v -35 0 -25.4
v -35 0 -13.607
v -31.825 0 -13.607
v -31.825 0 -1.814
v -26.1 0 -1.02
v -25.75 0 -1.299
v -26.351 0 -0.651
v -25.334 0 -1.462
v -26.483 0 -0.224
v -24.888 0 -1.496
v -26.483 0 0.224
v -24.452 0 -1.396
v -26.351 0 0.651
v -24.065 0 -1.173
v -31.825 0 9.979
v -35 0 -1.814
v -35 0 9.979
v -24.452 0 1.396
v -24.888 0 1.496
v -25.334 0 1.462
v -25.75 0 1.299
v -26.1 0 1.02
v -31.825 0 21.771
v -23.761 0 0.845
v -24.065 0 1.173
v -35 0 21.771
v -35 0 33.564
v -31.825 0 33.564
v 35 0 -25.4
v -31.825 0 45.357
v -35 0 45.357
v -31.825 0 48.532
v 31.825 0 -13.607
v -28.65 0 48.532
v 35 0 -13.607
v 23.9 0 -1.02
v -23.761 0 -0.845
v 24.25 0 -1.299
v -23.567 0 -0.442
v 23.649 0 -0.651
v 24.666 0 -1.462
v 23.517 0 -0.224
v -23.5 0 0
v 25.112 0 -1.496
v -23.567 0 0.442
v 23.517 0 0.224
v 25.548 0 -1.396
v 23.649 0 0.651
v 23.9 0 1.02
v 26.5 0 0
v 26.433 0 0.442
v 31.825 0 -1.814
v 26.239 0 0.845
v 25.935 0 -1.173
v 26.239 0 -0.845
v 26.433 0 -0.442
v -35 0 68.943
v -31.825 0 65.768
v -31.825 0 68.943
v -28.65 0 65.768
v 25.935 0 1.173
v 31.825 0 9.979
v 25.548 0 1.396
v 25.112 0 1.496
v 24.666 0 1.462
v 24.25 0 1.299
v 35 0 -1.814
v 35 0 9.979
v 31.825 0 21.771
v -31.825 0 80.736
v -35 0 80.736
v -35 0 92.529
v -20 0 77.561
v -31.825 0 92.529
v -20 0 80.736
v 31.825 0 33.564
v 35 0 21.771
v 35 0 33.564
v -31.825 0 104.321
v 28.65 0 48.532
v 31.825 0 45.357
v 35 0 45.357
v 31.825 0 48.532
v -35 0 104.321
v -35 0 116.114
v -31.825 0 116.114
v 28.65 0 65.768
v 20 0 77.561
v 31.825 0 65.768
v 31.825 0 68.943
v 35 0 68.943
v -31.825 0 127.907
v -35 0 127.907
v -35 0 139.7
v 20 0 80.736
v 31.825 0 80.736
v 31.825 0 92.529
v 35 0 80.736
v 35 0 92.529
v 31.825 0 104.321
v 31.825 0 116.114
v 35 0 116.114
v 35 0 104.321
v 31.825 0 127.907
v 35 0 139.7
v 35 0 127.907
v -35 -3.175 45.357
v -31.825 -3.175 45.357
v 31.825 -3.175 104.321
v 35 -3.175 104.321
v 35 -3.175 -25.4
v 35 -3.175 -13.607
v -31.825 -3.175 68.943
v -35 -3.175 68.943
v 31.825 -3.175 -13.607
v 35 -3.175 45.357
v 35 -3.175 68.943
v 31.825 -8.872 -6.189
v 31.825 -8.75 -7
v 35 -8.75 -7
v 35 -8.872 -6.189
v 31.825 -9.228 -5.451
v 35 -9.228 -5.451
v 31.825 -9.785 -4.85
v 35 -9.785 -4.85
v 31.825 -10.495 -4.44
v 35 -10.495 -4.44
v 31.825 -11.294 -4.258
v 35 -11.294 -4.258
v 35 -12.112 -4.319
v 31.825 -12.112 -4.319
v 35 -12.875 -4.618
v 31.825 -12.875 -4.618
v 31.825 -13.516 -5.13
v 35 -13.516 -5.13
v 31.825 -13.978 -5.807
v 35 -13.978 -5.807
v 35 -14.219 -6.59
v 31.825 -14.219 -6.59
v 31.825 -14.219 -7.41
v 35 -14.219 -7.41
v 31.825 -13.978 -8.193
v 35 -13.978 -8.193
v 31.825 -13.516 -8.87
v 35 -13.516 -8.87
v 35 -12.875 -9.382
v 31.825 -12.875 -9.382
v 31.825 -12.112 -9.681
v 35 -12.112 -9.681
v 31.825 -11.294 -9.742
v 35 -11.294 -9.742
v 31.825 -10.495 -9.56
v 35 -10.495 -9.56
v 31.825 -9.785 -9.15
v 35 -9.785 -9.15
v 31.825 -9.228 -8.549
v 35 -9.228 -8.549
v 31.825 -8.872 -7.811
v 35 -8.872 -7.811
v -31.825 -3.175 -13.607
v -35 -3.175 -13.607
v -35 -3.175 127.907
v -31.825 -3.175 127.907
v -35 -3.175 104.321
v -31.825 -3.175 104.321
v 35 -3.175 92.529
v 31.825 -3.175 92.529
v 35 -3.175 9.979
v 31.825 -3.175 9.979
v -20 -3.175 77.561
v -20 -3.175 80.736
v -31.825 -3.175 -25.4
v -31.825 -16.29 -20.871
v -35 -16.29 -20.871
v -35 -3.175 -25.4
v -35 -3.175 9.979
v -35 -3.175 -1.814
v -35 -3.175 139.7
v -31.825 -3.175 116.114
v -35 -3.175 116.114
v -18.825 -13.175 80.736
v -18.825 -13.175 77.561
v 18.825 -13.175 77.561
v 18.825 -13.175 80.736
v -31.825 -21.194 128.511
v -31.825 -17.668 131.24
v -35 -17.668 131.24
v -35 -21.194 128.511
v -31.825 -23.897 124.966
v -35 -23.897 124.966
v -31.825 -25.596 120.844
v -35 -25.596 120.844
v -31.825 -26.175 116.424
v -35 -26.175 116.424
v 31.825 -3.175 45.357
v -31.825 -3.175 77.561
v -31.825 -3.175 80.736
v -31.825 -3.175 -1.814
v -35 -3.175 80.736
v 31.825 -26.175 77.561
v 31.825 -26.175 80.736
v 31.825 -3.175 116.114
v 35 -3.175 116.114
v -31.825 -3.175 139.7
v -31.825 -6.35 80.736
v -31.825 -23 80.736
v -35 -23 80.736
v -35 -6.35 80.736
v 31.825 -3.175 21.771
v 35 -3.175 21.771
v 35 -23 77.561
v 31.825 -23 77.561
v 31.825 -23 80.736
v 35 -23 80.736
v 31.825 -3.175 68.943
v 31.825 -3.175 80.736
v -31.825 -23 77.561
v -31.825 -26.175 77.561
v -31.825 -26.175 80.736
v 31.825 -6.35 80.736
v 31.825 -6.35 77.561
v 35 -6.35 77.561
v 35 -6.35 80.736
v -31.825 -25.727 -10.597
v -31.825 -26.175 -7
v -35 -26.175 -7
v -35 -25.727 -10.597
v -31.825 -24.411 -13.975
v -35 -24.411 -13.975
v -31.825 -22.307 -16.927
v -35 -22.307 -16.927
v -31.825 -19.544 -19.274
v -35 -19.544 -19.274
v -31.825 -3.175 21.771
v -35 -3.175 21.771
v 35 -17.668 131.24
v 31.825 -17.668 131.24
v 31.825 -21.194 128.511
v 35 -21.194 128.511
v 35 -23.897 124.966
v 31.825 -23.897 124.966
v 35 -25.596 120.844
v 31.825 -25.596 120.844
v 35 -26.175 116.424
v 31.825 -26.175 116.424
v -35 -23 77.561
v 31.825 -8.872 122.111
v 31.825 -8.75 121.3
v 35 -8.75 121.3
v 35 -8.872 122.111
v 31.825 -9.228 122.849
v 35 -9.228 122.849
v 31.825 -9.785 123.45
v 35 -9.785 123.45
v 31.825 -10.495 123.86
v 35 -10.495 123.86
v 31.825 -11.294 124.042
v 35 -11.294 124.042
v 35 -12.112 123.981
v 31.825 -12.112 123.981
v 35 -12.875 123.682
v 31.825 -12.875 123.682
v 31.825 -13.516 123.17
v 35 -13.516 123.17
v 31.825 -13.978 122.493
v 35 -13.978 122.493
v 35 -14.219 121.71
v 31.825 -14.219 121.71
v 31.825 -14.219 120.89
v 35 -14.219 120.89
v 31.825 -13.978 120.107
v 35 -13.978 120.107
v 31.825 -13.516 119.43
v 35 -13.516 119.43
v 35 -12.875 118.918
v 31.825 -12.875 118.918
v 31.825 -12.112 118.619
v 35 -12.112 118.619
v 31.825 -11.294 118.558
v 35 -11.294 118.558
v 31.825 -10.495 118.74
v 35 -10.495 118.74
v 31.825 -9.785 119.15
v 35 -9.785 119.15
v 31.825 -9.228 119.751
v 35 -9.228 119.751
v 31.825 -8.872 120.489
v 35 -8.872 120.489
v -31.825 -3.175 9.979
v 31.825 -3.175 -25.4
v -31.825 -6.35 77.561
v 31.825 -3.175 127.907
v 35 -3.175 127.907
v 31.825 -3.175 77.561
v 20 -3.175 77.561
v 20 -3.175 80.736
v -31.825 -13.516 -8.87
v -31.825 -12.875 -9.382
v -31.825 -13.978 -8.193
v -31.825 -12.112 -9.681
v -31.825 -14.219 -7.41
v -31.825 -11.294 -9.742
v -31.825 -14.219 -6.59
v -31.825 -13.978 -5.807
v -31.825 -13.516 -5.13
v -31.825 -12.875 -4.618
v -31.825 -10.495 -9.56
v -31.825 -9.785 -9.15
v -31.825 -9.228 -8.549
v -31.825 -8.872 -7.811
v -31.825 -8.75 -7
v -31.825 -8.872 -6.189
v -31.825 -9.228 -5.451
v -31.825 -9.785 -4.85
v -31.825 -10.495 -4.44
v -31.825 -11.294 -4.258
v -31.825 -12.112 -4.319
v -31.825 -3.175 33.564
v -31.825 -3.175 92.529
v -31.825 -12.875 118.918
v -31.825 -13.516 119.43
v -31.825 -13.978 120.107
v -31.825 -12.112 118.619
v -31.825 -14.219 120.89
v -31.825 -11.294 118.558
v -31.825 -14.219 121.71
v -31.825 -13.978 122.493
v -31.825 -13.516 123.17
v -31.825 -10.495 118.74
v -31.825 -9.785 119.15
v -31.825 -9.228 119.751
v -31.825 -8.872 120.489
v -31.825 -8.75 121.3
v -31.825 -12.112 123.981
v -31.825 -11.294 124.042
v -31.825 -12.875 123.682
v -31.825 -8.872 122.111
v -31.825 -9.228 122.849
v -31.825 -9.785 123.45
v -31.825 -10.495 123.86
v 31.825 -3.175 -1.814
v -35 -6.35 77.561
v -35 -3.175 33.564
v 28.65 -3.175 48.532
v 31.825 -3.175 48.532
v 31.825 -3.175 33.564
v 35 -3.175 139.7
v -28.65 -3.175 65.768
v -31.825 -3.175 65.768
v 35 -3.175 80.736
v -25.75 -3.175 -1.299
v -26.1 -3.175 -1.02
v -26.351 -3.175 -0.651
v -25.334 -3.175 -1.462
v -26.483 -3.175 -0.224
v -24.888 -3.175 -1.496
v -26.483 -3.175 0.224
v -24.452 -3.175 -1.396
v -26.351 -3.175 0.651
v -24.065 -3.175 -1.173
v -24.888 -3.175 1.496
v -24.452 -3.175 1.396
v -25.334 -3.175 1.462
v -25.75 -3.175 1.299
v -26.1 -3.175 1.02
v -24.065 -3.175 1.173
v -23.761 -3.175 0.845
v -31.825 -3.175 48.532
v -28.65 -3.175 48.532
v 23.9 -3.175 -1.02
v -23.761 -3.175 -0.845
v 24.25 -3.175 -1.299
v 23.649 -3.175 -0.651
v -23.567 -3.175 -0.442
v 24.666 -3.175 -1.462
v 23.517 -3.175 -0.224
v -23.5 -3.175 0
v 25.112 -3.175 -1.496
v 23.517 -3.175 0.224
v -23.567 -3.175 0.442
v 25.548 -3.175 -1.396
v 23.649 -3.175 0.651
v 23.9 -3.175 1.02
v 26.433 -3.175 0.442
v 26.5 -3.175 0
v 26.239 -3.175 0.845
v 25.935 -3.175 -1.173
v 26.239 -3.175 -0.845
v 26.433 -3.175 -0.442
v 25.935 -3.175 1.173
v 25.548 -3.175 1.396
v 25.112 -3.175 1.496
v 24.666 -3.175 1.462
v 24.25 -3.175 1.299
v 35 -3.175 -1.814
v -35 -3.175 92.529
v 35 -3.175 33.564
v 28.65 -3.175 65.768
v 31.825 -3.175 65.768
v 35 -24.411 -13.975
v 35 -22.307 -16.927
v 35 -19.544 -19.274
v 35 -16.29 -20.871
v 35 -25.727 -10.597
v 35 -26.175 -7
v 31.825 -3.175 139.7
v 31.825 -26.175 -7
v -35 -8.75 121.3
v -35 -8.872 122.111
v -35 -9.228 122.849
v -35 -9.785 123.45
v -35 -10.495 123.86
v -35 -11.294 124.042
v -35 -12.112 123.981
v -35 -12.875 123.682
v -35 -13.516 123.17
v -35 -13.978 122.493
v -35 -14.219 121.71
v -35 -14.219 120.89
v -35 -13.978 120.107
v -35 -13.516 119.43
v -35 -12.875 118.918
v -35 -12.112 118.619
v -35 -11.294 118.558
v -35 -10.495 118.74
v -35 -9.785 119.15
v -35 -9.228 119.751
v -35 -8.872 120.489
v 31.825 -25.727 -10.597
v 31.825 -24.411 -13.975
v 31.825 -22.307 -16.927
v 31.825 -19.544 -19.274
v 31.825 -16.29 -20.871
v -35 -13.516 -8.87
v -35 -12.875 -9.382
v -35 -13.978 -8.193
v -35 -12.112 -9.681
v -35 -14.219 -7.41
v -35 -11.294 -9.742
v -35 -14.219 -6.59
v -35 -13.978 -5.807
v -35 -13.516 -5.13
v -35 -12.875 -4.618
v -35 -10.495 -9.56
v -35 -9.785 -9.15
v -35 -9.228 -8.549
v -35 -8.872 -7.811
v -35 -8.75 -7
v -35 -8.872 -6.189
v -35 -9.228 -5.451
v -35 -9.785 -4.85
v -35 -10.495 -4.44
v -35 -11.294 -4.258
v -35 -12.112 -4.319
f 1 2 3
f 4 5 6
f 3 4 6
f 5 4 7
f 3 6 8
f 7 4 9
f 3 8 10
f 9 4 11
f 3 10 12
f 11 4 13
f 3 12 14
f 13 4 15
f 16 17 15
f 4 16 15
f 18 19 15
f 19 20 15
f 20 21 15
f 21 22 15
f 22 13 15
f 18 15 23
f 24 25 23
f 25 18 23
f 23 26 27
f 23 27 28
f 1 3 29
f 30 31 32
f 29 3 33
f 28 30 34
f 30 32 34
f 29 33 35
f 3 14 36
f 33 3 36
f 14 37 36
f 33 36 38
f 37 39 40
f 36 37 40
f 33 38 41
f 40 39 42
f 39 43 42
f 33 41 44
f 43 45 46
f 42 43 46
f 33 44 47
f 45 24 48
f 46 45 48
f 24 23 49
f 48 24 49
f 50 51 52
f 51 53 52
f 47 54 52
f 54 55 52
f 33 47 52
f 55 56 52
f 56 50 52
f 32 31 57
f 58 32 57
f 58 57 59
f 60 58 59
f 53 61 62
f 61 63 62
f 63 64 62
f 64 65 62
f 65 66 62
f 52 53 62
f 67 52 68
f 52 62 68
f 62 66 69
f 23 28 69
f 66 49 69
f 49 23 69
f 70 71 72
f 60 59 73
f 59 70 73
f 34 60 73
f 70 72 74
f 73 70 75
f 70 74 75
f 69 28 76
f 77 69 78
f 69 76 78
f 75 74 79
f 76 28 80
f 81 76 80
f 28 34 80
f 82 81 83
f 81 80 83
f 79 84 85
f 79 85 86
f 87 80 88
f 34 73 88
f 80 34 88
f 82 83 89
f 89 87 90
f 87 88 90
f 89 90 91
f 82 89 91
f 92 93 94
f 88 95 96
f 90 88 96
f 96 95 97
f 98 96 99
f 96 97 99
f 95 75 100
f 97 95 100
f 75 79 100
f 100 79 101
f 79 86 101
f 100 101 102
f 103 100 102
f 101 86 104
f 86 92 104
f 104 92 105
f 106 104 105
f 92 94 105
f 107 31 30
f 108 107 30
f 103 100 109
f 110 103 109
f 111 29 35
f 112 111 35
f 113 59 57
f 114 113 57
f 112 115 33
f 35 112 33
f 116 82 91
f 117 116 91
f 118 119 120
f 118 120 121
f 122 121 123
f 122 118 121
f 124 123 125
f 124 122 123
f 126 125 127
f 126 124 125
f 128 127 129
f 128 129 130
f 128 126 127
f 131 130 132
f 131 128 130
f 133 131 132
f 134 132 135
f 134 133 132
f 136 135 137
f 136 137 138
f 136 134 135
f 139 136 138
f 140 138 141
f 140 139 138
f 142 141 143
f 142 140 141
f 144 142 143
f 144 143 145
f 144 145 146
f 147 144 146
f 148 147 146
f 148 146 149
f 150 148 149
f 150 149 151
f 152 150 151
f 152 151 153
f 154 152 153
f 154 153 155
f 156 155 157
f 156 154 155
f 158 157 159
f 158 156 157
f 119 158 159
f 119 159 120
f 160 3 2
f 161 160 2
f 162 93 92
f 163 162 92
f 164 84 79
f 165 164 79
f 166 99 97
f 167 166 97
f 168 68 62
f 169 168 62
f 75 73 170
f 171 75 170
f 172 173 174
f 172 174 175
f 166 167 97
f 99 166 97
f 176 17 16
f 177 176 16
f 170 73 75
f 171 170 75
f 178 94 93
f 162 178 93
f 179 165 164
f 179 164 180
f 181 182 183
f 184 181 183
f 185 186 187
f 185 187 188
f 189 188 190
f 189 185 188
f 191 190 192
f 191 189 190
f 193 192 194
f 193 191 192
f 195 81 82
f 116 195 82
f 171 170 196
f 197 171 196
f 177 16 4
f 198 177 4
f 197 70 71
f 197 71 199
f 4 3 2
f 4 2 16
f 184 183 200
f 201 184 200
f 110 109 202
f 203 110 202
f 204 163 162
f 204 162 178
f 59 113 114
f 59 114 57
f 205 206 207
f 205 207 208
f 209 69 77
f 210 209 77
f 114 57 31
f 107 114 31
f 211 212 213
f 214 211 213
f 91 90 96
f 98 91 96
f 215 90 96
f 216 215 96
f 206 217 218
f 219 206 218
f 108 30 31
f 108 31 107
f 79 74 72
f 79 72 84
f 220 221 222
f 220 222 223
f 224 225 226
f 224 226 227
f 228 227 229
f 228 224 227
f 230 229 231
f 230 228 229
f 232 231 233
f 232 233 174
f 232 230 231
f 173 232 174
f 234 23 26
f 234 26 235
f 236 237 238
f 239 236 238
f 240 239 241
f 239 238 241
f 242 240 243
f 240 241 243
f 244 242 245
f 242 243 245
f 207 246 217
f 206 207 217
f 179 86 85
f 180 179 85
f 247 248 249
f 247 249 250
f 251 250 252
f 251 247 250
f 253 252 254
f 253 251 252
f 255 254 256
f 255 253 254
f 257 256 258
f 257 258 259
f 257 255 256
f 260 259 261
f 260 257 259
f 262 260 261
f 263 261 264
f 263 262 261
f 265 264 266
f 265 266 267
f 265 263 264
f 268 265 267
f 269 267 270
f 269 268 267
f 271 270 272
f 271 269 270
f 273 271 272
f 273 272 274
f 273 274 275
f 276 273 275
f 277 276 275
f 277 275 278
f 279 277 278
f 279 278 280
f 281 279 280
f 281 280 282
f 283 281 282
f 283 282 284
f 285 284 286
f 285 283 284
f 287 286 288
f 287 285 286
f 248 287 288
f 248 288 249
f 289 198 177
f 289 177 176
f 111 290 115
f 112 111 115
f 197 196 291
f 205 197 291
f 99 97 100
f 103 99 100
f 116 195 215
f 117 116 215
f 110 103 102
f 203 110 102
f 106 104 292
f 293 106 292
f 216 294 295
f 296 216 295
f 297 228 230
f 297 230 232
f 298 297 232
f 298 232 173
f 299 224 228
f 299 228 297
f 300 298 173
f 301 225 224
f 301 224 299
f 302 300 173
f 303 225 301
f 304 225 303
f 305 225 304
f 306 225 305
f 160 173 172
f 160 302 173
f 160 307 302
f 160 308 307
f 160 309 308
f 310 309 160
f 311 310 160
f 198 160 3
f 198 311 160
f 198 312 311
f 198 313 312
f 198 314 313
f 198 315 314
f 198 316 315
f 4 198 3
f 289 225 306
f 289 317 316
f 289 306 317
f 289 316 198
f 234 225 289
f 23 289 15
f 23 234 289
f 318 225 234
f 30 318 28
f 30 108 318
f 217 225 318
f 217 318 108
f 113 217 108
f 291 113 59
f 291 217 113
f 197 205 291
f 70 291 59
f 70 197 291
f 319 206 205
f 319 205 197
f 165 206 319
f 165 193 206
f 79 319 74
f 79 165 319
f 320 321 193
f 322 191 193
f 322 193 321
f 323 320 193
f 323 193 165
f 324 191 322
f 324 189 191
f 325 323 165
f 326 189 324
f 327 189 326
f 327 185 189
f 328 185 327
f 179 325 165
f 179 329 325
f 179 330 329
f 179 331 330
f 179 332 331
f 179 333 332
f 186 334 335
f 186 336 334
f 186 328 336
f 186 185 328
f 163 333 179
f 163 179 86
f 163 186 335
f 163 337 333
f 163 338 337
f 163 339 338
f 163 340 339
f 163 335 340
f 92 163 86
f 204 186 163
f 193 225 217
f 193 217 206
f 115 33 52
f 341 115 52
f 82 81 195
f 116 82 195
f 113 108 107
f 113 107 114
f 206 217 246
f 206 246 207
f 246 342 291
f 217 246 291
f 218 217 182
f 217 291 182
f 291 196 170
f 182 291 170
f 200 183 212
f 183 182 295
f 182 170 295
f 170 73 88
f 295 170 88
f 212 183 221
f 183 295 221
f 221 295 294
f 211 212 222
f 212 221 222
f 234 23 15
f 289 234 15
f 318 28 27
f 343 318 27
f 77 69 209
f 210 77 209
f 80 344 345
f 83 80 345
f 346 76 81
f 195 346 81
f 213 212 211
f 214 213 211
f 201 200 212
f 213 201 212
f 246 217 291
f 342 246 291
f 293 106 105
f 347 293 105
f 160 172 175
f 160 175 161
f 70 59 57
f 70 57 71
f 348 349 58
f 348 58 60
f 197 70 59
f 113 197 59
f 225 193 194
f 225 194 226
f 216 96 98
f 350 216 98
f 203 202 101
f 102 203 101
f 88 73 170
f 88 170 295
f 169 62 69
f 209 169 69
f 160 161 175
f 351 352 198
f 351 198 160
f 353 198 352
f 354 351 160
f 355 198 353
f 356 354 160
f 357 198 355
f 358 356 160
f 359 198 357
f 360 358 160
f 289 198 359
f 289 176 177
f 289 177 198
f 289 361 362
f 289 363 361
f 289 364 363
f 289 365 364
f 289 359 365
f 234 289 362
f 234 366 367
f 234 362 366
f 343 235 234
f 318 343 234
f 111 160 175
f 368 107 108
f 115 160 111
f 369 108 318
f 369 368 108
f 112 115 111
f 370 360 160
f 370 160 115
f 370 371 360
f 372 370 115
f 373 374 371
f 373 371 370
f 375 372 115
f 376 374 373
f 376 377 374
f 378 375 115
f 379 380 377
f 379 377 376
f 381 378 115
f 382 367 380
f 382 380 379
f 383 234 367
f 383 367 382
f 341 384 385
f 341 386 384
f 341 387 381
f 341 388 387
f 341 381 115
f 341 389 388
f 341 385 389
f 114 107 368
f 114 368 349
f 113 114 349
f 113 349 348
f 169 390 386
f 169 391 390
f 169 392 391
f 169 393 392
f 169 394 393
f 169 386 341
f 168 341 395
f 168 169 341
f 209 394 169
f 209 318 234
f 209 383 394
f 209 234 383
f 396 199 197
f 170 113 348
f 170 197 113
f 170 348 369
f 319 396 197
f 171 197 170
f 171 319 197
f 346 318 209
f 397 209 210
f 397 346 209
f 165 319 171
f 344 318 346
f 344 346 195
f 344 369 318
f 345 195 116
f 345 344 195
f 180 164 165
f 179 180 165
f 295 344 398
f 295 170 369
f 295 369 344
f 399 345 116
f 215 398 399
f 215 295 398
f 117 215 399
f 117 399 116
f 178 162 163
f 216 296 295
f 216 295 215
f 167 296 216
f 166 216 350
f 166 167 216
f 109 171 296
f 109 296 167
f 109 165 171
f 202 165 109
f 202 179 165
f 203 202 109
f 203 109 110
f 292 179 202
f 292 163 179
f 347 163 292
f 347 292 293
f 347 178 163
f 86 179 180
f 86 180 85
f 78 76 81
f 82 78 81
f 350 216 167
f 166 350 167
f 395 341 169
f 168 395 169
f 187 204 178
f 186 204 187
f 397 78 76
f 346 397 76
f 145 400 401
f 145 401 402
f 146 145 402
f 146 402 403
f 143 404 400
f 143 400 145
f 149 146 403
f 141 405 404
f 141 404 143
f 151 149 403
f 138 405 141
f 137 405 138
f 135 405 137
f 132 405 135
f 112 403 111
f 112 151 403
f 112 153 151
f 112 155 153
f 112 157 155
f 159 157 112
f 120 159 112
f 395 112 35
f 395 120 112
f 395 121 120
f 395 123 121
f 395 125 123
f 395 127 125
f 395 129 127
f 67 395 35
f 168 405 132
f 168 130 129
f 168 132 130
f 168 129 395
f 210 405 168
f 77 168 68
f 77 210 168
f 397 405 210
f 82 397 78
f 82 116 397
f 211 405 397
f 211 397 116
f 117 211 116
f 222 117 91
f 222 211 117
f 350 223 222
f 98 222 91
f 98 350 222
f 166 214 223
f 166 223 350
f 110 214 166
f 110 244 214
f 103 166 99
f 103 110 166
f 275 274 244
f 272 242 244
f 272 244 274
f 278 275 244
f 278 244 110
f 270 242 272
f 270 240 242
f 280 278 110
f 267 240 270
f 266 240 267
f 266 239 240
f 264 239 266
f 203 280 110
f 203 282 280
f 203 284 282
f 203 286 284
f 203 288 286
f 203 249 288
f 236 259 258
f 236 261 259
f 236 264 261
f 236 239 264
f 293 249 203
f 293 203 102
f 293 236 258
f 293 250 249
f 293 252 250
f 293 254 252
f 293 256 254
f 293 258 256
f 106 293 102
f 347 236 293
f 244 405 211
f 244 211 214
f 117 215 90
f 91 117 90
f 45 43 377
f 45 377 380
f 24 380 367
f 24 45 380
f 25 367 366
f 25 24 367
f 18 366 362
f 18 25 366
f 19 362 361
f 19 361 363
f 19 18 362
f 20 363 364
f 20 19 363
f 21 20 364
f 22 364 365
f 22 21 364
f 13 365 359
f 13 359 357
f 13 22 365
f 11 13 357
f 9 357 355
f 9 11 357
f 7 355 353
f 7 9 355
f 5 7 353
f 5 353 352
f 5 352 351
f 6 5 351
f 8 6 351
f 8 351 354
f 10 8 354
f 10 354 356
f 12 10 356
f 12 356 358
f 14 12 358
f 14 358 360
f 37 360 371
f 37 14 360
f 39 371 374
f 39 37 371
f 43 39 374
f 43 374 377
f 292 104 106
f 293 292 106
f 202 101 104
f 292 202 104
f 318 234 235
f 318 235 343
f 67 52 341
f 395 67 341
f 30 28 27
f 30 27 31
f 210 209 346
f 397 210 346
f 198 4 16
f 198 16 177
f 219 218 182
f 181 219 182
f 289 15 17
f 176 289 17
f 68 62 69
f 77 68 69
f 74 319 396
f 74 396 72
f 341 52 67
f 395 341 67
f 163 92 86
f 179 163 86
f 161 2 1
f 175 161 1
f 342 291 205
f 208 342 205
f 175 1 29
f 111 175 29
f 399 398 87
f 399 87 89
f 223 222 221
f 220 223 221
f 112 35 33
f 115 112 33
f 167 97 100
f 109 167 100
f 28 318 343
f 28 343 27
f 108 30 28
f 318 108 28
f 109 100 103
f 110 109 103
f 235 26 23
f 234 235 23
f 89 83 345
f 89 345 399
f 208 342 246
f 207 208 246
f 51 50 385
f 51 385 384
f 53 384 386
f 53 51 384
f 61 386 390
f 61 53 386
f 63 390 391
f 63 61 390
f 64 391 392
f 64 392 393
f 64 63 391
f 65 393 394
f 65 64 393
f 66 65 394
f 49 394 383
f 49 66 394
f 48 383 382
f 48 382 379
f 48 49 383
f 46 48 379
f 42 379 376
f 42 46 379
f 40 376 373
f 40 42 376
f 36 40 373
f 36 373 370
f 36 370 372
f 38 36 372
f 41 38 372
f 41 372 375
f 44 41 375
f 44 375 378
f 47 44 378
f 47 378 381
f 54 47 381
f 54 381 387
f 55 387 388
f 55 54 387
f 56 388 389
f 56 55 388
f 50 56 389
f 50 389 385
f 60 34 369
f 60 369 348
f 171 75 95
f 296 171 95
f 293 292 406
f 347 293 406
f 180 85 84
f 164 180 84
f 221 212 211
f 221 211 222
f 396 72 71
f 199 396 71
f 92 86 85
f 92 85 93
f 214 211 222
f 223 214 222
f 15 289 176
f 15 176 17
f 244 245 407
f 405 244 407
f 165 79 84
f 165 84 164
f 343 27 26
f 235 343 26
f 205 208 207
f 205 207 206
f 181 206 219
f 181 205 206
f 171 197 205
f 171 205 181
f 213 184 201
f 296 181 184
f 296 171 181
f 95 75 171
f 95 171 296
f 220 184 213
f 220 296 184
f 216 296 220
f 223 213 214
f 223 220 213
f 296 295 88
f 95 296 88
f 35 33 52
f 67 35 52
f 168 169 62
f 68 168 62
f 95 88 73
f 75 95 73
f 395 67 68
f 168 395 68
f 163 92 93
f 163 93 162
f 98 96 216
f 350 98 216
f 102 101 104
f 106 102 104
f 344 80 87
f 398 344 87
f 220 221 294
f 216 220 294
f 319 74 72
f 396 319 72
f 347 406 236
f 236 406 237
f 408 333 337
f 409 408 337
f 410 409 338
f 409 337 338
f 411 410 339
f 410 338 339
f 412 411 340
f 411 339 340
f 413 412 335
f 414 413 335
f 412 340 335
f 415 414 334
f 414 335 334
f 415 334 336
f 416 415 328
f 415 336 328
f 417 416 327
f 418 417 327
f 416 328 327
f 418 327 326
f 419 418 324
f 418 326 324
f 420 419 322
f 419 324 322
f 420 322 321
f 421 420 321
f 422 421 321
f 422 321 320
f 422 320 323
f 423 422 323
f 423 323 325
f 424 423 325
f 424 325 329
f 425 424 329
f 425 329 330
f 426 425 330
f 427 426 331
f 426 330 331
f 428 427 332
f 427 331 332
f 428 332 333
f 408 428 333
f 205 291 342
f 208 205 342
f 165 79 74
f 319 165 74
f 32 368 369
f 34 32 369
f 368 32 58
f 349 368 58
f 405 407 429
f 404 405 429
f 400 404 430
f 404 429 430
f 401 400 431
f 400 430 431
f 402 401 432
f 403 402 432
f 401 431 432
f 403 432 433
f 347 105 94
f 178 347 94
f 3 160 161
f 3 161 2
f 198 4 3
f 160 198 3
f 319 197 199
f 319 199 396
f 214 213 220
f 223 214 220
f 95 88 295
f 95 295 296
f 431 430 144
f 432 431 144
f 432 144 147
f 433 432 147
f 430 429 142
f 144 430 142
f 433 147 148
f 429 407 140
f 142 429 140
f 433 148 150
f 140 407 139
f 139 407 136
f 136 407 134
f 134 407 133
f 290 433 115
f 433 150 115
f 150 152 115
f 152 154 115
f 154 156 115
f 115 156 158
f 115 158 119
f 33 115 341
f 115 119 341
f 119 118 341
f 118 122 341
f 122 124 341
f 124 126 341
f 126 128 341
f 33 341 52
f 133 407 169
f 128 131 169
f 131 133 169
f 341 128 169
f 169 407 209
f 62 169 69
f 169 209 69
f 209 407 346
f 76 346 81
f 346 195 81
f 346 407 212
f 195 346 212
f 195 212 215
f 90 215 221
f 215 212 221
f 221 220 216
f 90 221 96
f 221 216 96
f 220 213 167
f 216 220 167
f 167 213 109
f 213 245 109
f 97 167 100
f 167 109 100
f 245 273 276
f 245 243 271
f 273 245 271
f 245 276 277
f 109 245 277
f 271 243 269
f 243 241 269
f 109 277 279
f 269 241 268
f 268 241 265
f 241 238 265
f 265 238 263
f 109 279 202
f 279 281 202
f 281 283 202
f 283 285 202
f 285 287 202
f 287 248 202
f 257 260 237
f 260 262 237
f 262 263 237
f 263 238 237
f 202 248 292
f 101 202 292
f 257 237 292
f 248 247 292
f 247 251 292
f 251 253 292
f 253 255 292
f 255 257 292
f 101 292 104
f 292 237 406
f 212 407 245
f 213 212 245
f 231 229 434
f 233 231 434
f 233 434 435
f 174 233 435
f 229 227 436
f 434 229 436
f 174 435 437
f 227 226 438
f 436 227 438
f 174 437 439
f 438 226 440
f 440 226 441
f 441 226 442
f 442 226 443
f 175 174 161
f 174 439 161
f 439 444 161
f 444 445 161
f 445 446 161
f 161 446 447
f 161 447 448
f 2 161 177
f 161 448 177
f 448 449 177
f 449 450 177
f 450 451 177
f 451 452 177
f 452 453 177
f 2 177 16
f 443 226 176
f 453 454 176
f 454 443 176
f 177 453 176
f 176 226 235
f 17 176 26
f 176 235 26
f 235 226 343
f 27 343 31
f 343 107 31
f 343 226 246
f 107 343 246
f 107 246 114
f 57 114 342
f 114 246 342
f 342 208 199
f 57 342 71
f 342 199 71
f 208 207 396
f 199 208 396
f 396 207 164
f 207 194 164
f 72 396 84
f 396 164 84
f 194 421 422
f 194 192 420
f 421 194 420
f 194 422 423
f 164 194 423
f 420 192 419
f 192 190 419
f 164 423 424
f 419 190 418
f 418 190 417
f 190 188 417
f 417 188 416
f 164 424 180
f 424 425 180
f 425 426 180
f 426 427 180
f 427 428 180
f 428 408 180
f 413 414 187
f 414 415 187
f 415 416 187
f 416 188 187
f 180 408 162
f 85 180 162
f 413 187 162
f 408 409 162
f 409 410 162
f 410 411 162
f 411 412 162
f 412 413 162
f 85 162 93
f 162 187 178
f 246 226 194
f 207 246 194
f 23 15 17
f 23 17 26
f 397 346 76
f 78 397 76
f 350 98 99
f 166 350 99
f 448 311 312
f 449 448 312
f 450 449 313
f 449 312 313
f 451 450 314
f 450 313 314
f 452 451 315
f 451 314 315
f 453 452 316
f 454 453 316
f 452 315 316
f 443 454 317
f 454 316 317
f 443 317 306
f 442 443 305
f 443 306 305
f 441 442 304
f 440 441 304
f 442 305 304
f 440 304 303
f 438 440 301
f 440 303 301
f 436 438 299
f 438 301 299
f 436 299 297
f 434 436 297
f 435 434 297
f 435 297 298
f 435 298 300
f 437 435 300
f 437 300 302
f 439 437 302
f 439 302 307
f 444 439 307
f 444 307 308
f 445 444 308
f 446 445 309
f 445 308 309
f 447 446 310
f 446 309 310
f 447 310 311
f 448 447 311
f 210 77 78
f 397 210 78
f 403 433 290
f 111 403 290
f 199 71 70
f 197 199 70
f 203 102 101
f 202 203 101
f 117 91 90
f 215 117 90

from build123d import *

# Parameters (mm, degrees)
F2_R     = 1.5
F2_W     = 3.175
F2_H     = 17.2357142857
F2_W_2   = 40
F2_H_2   = 3.175
F3_DEPTH = 3.175
F5_START = 31.825
F4_R     = 2.75
F4_W     = 16.65
F4_H     = 3.175
F5_DEPTH = 3.175
F8_DEPTH = 3.175


# Not quite as in the source:
# - a length typed as a fraction of an inch, garbled in the dataset ("3 / 203.2 mm" for 3/8 in), is restored


with BuildPart() as f3:
    # F2 (on Front) → F3 (new body)
    with BuildSketch(Plane.XZ):
        Polygon((-35, -25.4), (0, -25.4), (35, -25.4), (35, -13.6071428571), (31.825, -13.6071428571), (31.825, -1.8142857143), (35, -1.8142857143), (35, 9.9785714286), (31.825, 9.9785714286), (31.825, 21.7714285714), (35, 21.7714285714), (35, 33.5642857143), (31.825, 33.5642857143), (31.825, 45.3571428571), (35, 45.3571428571), (35, 57.15), (35, 68.9428571429), (31.825, 68.9428571429), (31.825, 80.7357142857), (35, 80.7357142857), (35, 92.5285714286), (31.825, 92.5285714286), (31.825, 104.3214285714), (35, 104.3214285714), (35, 116.1142857143), (31.825, 116.1142857143), (31.825, 127.9071428571), (35, 127.9071428571), (35, 139.7), (0, 139.7), (-35, 139.7), (-35, 127.9071428571), (-31.825, 127.9071428571), (-31.825, 116.1142857143), (-35, 116.1142857143), (-35, 104.3214285714), (-31.825, 104.3214285714), (-31.825, 92.5285714286), (-35, 92.5285714286), (-35, 80.7357142857), (-31.825, 80.7357142857), (-31.825, 68.9428571429), (-35, 68.9428571429), (-35, 57.15), (-35, 45.3571428571), (-31.825, 45.3571428571), (-31.825, 33.5642857143), (-35, 33.5642857143), (-35, 21.7714285714), (-31.825, 21.7714285714), (-31.825, 9.9785714286), (-35, 9.9785714286), (-35, -1.8142857143), (-31.825, -1.8142857143), (-31.825, -13.6071428571), (-35, -13.6071428571), align=None)
        with Locations((-25, 0)):
            Circle(F2_R, mode=Mode.SUBTRACT)
        with Locations((25, 0)):
            Circle(F2_R, mode=Mode.SUBTRACT)
        with Locations((-30.2375, 57.15)):
            Rectangle(F2_W, F2_H, mode=Mode.SUBTRACT)
        with Locations((0, 79.1482142857)):
            Rectangle(F2_W_2, F2_H_2, mode=Mode.SUBTRACT)
        with Locations((30.2375, 57.15)):
            Rectangle(F2_W, F2_H, mode=Mode.SUBTRACT)
    extrude(amount=F3_DEPTH)


with BuildPart() as f5:
    # F4 (on Right) → F5 (new body)
    with BuildSketch(Plane.YZ.offset(F5_START)):
        with BuildLine():
            Line((-16.2899039976, -20.8712812924), (-3.175, -25.4))
            Line((-3.175, -25.4), (-3.175, -13.6071428571))
            Line((-3.175, -13.6071428571), (0, -13.6071428571))
            Line((0, -13.6071428571), (0, -1.8142857143))
            Line((0, -1.8142857143), (-3.175, -1.8142857143))
            Line((-3.175, -1.8142857143), (-3.175, 9.9785714286))
            Line((-3.175, 9.9785714286), (0, 9.9785714286))
            Line((0, 9.9785714286), (0, 21.7714285714))
            Line((0, 21.7714285714), (-3.175, 21.7714285714))
            Line((-3.175, 21.7714285714), (-3.175, 33.5642857143))
            Line((-3.175, 33.5642857143), (0, 33.5642857143))
            Line((0, 33.5642857143), (0, 45.3571428571))
            Line((0, 45.3571428571), (-3.175, 45.3571428571))
            Line((-3.175, 45.3571428571), (-3.175, 57.15))
            Line((-3.175, 57.15), (-3.175, 68.9428571429))
            Line((-3.175, 68.9428571429), (0, 68.9428571429))
            Line((0, 68.9428571429), (0, 80.7357142857))
            Line((0, 80.7357142857), (-3.175, 80.7357142857))
            Line((-3.175, 80.7357142857), (-3.175, 92.5285714286))
            Line((-3.175, 92.5285714286), (0, 92.5285714286))
            Line((0, 92.5285714286), (0, 104.3214285714))
            Line((0, 104.3214285714), (-3.175, 104.3214285714))
            Line((-3.175, 104.3214285714), (-3.175, 116.1142857143))
            Line((-3.175, 116.1142857143), (0, 116.1142857143))
            Line((0, 116.1142857143), (0, 127.9071428571))
            Line((0, 127.9071428571), (-3.175, 127.9071428571))
            Line((-3.175, 127.9071428571), (-3.175, 139.7))
            Line((-3.175, 139.7), (-17.6680646356, 131.239778703))
            ThreePointArc((-17.6680646356, 131.239778703), (-23.8970296567, 124.9659809178), (-26.175, 116.4236513176))
            Line((-26.175, 116.4236513176), (-26.175, -7))
            ThreePointArc((-26.175, -7), (-23.4508883805, -15.5165657349), (-16.2899039976, -20.8712812924))
        make_face()
        with Locations((-11.5, -7)):
            Circle(F4_R, mode=Mode.SUBTRACT)
        with Locations((-14.675, 79.1482142857)):
            Rectangle(F4_W, F4_H, mode=Mode.SUBTRACT)
        with Locations((-11.5, 121.3)):
            Circle(F4_R, mode=Mode.SUBTRACT)
    extrude(amount=F5_DEPTH)


with BuildPart() as f6_1:
    # F6: instance of F5
    add(f5.part.mirror(Plane.YZ))


with BuildPart() as f8:
    # F7 (on face) → F8 (new body)
    with BuildSketch(Plane.XY.offset(77.5607142857)):
        Polygon((-18.825, -13.175), (0, -13.175), (18.825, -13.175), (31.825, -26.175), (31.825, -23), (35, -23), (35, -6.35), (31.825, -6.35), (31.825, -3.175), (20, -3.175), (20, 0), (0, 0), (-20, 0), (-20, -3.175), (-31.825, -3.175), (-31.825, -6.35), (-35, -6.35), (-35, -23), (-31.825, -23), (-31.825, -26.175), align=None)
    extrude(amount=F8_DEPTH)


solid = Compound([f3.part, f5.part, f6_1.part, f8.part])
